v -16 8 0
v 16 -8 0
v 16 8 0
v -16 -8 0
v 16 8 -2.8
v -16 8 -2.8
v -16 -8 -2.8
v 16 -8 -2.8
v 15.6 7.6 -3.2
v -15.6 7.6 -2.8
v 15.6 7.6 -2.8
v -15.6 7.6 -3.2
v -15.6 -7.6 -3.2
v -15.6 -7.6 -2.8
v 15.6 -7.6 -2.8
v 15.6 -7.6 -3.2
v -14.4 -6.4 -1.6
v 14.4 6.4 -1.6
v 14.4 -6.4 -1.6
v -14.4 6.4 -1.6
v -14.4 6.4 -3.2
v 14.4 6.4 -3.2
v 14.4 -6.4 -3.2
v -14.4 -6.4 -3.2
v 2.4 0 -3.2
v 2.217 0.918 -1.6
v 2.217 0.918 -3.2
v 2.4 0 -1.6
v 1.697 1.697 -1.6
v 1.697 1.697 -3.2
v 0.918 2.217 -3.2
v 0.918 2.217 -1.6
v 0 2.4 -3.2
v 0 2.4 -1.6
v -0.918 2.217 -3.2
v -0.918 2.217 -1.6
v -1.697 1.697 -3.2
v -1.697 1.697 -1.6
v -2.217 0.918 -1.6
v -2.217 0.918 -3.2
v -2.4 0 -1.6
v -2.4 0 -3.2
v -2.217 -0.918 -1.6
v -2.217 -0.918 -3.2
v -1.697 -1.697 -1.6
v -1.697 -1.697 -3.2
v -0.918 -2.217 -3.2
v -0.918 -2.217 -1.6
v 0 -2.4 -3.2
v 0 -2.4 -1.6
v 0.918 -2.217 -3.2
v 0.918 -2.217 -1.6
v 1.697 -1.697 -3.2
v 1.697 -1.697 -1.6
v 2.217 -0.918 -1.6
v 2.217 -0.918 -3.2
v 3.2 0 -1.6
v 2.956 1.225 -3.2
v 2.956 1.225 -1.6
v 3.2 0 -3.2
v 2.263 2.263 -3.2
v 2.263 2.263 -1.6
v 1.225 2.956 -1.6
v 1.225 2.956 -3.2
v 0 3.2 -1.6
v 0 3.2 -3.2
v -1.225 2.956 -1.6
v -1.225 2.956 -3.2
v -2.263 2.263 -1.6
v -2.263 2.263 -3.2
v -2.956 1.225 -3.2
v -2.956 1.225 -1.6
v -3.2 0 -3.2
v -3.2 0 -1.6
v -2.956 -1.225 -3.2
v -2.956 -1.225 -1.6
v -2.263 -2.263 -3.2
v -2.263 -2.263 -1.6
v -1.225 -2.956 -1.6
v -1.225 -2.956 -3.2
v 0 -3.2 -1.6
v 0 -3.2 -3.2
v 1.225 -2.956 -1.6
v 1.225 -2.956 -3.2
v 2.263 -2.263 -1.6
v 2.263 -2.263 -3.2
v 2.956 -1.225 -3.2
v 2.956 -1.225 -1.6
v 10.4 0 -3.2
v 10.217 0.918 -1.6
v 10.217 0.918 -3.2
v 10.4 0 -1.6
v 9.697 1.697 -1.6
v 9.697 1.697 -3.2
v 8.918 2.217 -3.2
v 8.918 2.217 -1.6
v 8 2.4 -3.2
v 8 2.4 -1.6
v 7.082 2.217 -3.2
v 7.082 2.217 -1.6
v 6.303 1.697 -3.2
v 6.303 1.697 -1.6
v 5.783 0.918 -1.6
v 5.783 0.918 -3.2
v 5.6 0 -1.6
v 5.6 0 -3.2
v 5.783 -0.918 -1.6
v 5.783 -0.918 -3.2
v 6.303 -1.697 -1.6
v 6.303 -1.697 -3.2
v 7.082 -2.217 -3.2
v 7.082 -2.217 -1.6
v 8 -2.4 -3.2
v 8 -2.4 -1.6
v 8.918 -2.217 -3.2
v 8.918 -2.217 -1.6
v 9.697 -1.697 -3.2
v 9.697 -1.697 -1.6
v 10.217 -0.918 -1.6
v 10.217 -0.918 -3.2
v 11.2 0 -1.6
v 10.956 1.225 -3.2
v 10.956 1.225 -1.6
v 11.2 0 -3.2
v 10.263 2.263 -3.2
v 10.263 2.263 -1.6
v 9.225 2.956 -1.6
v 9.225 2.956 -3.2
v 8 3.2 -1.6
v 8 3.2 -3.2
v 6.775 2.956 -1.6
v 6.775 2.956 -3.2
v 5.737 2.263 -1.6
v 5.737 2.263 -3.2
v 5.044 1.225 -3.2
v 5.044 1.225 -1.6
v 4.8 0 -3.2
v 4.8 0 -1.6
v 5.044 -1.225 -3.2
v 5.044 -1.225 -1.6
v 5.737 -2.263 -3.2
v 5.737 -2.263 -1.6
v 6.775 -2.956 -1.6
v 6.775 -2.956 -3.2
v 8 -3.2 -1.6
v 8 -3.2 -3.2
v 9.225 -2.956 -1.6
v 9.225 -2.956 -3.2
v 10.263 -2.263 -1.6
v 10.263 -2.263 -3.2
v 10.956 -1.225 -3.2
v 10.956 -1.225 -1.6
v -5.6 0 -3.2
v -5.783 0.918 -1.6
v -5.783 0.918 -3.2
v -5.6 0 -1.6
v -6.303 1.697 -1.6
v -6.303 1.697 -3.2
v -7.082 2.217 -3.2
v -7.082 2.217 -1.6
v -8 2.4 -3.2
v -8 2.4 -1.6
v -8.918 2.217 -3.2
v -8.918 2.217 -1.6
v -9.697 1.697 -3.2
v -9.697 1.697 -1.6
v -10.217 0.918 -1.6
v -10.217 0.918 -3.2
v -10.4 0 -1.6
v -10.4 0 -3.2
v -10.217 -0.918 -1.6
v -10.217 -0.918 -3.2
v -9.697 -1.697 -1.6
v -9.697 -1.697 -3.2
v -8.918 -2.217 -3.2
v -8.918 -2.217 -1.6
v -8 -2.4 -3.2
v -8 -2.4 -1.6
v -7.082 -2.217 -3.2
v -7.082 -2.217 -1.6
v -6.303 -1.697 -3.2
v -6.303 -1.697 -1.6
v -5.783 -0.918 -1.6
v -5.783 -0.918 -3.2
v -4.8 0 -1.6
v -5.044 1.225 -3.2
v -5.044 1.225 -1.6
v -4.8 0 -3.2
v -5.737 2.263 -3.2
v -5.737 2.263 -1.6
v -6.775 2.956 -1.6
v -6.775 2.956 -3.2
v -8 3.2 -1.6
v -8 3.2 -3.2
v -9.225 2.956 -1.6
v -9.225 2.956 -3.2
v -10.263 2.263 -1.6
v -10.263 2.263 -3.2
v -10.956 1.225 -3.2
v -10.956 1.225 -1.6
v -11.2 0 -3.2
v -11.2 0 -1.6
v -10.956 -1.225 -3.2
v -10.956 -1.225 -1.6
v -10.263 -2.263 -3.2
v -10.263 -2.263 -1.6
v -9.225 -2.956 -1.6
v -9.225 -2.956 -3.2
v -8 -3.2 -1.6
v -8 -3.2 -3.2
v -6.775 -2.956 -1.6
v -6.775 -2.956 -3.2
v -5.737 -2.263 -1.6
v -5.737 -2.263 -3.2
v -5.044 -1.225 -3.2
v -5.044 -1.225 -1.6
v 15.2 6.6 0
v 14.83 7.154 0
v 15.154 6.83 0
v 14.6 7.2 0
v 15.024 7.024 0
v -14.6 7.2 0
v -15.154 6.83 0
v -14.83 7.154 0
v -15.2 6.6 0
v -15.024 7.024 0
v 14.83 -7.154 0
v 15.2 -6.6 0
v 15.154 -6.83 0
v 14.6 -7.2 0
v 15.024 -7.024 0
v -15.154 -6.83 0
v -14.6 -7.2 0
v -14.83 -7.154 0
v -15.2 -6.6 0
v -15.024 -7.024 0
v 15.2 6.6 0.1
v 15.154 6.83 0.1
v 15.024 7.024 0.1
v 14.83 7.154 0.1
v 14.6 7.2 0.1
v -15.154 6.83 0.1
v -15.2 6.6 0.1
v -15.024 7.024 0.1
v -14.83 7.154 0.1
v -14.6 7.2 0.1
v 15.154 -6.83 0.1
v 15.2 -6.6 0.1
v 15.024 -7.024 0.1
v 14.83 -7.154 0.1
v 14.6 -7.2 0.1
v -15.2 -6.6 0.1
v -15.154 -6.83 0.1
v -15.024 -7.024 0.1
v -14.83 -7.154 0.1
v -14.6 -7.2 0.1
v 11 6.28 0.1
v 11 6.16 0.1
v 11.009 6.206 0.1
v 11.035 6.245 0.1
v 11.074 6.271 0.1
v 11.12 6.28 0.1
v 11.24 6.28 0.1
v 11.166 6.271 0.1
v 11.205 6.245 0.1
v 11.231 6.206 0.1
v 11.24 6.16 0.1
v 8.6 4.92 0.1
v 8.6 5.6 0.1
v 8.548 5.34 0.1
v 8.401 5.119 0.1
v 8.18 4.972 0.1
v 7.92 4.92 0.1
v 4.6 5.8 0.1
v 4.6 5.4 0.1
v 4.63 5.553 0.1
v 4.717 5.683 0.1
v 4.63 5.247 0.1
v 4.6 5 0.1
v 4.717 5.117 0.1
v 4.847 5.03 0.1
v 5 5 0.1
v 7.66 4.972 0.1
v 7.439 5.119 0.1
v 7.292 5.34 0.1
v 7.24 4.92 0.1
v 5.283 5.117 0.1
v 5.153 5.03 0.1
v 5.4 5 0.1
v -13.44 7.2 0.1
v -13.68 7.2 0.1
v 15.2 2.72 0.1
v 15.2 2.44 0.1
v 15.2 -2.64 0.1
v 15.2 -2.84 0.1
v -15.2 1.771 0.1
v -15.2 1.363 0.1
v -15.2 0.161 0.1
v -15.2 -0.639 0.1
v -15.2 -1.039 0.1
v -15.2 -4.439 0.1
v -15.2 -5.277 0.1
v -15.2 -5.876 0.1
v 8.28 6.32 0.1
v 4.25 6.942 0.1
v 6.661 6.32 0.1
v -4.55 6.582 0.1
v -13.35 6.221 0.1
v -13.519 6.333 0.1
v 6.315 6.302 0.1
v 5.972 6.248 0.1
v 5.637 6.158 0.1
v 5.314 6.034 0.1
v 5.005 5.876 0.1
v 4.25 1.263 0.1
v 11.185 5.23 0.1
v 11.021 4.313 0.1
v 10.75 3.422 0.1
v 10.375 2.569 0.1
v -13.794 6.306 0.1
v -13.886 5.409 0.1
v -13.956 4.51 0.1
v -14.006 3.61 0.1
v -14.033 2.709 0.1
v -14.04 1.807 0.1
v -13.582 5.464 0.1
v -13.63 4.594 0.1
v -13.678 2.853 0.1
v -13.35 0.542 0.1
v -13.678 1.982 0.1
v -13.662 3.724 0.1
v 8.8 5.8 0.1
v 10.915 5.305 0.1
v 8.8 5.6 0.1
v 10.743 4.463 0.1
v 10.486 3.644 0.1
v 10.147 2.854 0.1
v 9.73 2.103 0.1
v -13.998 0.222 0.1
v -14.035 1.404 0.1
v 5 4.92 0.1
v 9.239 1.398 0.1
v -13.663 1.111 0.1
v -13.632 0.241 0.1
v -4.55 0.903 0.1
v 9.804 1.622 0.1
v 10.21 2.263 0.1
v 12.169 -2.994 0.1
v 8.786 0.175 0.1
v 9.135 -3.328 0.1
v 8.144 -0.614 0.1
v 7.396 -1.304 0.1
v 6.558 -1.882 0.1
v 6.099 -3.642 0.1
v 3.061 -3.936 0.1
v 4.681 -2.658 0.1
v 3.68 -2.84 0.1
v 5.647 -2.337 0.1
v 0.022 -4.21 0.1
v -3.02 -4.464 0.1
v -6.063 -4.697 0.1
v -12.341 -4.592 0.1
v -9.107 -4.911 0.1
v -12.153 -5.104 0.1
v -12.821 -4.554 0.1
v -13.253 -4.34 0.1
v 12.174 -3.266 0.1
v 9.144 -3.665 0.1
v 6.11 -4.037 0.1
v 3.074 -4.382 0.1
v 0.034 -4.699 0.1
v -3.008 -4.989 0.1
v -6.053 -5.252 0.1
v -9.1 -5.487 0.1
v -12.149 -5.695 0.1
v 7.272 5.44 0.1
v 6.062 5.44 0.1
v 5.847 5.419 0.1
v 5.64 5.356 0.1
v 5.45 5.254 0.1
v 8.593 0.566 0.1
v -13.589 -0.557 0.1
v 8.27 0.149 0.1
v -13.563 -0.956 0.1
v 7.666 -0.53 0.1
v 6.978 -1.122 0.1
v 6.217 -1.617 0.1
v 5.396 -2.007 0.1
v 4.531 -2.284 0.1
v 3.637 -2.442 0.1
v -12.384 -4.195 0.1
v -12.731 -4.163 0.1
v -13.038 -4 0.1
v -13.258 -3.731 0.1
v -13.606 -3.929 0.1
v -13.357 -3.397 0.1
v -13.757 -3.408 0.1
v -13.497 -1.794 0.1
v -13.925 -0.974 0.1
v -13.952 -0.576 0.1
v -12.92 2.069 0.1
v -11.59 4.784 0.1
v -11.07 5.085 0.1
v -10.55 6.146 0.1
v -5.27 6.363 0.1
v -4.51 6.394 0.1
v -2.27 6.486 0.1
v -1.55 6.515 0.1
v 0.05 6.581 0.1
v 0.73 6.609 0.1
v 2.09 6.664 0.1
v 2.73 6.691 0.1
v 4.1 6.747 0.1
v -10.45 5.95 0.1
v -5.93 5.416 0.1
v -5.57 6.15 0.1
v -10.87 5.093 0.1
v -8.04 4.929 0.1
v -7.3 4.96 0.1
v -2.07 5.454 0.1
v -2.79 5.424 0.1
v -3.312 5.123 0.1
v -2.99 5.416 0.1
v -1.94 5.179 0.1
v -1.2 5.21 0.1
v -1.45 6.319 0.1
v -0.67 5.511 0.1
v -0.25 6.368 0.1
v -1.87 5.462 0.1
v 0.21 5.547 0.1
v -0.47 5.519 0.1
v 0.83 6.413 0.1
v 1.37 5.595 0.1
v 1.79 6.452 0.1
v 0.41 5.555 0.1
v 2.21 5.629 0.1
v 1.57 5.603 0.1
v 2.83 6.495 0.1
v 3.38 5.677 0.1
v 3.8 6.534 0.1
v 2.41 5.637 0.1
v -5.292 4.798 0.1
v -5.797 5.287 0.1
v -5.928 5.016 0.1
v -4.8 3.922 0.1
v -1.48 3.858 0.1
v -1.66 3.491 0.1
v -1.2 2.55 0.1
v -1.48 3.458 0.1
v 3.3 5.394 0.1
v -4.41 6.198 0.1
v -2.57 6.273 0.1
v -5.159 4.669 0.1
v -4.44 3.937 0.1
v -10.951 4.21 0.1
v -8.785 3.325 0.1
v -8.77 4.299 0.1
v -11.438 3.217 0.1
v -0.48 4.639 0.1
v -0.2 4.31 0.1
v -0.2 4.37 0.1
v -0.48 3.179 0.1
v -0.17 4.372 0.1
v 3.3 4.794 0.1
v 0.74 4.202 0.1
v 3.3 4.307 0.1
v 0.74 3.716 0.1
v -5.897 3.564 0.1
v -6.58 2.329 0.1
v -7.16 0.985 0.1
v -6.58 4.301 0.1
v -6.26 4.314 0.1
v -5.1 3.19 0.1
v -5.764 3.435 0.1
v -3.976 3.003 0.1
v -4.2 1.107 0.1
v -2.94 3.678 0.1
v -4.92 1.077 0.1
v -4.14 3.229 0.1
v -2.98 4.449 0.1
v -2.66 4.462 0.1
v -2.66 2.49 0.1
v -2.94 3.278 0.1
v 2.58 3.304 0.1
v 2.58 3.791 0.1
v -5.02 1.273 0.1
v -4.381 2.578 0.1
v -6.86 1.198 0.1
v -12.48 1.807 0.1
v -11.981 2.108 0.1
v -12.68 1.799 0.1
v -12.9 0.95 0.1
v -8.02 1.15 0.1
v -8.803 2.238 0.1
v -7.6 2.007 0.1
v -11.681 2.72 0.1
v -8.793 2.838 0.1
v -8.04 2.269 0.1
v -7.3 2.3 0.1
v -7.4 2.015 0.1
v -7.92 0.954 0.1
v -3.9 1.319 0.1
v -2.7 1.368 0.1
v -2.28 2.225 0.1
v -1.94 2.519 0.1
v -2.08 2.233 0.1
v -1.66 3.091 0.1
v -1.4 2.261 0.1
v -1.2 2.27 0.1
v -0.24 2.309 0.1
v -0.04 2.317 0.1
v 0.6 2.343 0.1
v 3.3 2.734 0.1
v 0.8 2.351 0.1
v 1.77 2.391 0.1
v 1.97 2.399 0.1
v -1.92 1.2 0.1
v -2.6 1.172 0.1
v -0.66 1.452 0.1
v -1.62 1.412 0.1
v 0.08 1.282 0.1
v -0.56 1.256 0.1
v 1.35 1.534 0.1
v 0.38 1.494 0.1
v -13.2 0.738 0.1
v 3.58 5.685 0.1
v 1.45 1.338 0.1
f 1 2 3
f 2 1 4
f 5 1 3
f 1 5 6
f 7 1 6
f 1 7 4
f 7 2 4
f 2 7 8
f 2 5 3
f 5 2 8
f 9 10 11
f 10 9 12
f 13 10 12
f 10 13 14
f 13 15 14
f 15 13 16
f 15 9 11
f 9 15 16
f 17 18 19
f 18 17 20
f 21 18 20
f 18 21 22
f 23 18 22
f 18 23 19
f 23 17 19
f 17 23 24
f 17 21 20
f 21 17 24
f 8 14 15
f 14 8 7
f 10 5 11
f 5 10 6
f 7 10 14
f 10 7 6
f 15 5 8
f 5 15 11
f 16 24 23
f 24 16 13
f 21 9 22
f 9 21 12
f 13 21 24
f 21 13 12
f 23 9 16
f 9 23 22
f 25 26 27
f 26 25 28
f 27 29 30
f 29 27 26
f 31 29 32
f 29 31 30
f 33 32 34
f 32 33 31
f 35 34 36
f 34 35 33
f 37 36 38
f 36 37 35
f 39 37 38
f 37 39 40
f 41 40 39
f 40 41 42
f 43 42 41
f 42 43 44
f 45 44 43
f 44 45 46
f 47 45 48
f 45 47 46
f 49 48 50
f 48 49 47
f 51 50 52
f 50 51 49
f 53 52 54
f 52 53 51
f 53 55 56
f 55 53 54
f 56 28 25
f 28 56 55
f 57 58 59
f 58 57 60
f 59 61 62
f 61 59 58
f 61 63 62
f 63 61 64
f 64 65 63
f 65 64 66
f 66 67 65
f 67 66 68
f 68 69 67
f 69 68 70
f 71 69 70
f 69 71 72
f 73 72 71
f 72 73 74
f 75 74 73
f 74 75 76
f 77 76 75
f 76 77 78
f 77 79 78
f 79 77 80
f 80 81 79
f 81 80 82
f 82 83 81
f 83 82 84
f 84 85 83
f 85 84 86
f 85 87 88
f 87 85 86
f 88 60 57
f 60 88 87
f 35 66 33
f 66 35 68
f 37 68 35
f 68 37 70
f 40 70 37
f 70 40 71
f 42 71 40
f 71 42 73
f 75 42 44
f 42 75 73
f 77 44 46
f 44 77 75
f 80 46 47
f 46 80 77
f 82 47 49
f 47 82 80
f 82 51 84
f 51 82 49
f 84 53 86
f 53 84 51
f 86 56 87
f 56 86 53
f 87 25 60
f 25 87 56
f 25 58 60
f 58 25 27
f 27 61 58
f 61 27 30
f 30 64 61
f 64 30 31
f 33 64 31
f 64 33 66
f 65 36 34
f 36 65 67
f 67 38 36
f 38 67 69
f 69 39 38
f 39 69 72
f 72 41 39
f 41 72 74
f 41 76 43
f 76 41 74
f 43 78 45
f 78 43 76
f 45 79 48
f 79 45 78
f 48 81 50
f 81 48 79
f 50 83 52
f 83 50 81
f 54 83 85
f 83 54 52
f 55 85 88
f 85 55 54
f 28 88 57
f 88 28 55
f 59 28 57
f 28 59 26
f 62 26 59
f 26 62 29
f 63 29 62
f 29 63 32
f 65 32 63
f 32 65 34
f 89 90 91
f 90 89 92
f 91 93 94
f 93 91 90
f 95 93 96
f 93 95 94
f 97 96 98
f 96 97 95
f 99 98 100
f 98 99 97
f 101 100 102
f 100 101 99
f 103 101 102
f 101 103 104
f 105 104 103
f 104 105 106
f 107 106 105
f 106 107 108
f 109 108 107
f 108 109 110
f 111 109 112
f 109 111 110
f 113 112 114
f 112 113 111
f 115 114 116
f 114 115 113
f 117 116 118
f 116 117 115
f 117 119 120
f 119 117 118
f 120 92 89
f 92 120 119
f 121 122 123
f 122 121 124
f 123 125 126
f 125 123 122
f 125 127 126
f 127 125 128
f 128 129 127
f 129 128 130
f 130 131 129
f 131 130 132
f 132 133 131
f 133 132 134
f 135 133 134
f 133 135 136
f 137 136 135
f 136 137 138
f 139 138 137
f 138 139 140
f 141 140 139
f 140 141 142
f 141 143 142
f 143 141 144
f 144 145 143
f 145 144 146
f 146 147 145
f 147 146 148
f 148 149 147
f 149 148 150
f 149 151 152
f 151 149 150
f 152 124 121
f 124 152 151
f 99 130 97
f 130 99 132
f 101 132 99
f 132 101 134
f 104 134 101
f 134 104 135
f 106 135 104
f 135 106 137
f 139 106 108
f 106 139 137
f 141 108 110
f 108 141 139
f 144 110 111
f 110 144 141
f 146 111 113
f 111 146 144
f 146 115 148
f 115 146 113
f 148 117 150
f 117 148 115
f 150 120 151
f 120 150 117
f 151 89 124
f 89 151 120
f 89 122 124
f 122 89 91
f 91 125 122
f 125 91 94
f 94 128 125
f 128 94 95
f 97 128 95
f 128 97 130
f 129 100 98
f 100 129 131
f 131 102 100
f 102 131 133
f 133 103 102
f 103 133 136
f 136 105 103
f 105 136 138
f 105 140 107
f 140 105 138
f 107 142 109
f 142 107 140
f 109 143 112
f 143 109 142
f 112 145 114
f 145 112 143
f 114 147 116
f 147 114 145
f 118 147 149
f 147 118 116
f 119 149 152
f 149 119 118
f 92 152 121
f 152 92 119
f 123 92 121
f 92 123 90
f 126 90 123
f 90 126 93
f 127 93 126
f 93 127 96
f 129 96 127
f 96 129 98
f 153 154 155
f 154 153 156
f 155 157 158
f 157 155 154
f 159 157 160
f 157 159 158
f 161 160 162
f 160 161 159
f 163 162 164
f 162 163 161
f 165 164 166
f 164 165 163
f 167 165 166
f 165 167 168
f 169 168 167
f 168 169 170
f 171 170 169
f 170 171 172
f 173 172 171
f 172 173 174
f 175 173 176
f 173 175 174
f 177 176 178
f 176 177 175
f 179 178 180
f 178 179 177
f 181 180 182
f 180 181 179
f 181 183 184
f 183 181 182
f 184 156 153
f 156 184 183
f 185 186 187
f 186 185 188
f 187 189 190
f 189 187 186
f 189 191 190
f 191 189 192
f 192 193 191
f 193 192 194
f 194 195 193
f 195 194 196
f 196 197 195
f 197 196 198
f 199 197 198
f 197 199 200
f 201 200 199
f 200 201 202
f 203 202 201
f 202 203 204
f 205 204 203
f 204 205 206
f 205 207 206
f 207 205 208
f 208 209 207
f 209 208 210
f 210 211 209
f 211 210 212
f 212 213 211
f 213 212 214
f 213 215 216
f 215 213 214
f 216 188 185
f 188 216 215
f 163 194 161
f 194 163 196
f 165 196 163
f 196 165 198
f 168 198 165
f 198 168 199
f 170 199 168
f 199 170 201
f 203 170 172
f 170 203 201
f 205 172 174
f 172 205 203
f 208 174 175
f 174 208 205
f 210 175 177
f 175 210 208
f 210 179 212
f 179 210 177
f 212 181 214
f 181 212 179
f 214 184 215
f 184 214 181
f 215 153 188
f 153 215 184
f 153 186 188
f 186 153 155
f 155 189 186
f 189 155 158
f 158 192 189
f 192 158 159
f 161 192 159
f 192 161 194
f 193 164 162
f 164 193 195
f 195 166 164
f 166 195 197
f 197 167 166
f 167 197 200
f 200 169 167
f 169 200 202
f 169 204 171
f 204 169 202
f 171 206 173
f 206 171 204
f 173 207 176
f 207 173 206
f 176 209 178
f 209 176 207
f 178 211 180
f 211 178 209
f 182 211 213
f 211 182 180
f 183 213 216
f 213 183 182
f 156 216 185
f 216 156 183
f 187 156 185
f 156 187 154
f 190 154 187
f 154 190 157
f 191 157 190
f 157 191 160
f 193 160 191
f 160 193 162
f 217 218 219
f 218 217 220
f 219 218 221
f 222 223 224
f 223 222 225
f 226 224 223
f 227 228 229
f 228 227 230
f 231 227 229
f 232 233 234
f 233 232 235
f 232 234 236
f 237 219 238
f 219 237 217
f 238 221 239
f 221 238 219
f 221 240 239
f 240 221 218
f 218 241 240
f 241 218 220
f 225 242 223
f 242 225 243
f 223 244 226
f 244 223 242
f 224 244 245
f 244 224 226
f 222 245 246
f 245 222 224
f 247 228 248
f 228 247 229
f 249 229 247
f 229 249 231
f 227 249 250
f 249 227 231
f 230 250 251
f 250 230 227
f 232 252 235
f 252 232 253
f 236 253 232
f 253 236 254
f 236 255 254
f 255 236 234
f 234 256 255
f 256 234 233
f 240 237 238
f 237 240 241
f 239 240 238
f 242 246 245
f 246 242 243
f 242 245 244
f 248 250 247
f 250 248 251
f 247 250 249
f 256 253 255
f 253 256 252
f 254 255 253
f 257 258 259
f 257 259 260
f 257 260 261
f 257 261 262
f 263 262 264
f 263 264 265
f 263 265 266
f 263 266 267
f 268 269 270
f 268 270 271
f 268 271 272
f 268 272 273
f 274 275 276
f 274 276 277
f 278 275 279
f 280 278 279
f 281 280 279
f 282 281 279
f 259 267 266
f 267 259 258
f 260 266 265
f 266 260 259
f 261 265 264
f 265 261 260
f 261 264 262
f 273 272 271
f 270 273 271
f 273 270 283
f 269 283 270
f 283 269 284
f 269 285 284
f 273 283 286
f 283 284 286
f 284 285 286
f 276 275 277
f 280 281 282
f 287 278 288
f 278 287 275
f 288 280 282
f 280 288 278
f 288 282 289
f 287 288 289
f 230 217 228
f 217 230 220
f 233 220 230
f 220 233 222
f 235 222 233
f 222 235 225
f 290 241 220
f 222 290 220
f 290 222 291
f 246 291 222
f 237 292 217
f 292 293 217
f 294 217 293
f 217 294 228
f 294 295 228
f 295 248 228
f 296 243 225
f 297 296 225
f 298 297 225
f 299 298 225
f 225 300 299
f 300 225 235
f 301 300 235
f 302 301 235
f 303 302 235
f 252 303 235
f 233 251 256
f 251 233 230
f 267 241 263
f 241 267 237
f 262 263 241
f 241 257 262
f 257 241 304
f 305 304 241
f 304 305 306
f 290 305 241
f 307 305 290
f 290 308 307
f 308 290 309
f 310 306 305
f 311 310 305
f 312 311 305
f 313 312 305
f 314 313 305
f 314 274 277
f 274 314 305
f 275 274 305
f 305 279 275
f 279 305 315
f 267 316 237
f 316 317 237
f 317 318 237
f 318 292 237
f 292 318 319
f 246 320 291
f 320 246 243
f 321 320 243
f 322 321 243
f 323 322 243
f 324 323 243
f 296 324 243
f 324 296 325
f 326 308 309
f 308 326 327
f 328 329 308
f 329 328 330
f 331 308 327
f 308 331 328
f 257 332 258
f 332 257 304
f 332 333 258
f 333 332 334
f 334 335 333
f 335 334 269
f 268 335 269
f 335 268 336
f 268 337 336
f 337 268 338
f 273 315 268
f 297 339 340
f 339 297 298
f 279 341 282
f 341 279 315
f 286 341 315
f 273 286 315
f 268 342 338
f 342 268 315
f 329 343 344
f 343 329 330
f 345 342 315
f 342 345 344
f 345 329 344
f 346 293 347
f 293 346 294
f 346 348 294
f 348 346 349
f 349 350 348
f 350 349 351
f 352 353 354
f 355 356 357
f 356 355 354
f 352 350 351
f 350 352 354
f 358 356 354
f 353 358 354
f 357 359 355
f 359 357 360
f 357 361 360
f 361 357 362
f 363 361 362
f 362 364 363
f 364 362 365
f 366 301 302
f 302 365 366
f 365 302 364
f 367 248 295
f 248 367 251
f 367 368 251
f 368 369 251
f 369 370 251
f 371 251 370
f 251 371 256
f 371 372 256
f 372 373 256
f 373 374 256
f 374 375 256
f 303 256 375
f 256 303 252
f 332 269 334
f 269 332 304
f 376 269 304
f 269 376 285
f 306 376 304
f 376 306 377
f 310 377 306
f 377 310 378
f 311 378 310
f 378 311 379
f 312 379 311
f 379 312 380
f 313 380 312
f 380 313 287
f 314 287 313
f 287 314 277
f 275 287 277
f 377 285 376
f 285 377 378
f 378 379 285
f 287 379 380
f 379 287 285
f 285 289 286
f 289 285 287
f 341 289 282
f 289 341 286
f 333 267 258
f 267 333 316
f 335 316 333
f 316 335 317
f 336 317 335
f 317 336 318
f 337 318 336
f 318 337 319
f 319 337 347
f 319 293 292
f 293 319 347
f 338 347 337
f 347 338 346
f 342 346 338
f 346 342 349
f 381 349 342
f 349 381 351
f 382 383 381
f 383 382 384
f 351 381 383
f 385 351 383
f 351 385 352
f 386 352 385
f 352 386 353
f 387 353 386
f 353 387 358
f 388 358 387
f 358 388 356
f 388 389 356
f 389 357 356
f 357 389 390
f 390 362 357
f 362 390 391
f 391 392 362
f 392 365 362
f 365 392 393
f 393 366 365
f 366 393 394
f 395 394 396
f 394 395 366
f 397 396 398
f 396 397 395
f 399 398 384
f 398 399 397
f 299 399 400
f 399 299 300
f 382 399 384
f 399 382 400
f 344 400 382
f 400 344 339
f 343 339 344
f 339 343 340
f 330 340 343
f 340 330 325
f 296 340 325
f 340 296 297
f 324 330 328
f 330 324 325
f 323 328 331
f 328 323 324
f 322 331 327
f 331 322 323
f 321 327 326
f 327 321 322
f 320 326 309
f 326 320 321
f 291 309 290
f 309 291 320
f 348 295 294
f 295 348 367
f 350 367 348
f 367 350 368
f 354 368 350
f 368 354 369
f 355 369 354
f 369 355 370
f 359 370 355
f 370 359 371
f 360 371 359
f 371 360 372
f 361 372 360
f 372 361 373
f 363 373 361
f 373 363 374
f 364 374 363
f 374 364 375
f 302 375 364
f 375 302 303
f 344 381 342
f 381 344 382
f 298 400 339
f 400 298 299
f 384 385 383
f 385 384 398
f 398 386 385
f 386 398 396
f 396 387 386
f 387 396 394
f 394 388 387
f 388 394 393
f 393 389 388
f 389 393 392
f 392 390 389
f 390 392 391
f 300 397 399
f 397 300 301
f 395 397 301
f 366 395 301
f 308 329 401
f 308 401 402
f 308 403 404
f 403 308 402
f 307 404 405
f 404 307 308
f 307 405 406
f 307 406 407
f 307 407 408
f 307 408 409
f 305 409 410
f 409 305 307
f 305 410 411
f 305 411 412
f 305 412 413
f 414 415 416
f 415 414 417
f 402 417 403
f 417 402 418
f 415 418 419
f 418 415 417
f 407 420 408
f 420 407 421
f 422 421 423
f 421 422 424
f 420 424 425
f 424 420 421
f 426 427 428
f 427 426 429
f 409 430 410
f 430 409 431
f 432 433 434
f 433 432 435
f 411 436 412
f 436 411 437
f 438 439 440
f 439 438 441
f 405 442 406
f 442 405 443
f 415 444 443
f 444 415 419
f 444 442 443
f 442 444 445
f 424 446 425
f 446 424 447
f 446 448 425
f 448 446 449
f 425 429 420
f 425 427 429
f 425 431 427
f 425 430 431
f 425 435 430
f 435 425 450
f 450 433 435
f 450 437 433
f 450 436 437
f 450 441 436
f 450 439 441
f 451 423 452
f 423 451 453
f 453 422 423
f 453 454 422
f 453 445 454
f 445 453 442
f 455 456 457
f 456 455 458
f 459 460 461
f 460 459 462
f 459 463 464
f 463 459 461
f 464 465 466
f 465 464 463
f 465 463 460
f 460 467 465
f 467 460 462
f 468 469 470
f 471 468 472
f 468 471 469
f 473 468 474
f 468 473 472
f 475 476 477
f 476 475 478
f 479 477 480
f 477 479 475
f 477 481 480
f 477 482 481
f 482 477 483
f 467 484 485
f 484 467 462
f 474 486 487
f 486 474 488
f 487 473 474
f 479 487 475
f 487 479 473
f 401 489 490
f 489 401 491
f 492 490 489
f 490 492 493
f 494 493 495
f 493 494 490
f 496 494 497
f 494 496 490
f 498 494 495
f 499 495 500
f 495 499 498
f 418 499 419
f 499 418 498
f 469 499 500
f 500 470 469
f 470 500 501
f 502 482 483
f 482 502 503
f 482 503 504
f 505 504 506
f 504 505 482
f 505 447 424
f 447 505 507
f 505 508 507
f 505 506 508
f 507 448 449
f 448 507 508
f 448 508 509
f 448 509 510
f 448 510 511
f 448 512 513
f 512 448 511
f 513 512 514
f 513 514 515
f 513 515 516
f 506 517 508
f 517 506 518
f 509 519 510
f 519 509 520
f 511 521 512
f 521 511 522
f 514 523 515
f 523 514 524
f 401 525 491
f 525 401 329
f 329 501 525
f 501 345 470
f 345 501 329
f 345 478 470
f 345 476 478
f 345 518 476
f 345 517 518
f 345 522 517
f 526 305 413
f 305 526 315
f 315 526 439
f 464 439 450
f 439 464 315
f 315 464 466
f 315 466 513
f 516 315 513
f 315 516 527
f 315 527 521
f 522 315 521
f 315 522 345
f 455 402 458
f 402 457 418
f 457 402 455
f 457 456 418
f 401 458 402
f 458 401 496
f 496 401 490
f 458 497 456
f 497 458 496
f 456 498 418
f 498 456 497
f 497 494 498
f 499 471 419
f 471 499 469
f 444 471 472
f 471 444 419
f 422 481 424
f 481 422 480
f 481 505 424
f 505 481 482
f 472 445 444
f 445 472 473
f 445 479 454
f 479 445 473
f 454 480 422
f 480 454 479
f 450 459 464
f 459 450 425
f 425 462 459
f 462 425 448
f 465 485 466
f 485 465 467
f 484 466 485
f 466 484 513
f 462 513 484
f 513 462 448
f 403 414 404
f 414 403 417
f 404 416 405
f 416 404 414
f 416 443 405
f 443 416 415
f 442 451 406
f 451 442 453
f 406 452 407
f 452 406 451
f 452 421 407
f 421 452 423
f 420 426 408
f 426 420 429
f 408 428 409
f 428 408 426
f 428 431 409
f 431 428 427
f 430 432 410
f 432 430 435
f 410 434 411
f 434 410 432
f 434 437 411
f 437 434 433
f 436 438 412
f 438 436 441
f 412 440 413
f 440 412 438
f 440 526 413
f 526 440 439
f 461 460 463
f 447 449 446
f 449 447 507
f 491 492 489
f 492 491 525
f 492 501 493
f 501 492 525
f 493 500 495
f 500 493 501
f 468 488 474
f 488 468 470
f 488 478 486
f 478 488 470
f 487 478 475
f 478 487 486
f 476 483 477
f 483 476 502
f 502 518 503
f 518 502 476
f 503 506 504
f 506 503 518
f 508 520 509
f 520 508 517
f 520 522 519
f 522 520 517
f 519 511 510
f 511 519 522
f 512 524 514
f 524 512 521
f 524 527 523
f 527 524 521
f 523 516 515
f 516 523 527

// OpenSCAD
use <../lib.scad>
use <6177741m.scad>
use <87079.scad>
function ldraw_lib__87079d1h() = [
// 0 Tile  2 x  4 with Door Outline with Yellow Stripes and White AMG Logo on Transparent Background Left Sticker
// 0 Name: 87079d1h.dat
// 0 Author: Alfred Schmitz [AlfredS]
// 0 !LDRAW_ORG Shortcut UPDATE 2026-08
// 0 !LICENSE Licensed under CC BY 4.0 : see CAreadme.txt
// 
// 0 BFC CERTIFY CCW
  [0,"BFC","CERTIFY"],
  [0,"BFC","CCW"],
// 
// 0 !CATEGORY Sticker Shortcut
// 0 !KEYWORDS AMG, GT3, Mercedes, Set 75877, Speed Champions
// 
// 0 !HISTORY 2026-08-31 [OrionP] Official Update 2026-08
// 
// 1 16 0 0 0 1 0 0 0 1 0 0 0 1 87079.dat
  [1,16,0,0,0,1,0,0,0,1,0,0,0,1, ldraw_lib__87079()],
// 1 16 0 0 0 1 0 0 0 1 0 0 0 1 6177741m.dat
  [1,16,0,0,0,1,0,0,0,1,0,0,0,1, ldraw_lib__6177741m()],
];
module ldraw_lib__87079d1h(step=0, col=false, unit=2/5, alt=false, line=0.2, solid=!$preview)
    makepoly(ldraw_lib__87079d1h(), step=step, col=col, unit=unit, alt=alt, line=line, solid=solid);
ldraw_lib__87079d1h(line=0.2);
